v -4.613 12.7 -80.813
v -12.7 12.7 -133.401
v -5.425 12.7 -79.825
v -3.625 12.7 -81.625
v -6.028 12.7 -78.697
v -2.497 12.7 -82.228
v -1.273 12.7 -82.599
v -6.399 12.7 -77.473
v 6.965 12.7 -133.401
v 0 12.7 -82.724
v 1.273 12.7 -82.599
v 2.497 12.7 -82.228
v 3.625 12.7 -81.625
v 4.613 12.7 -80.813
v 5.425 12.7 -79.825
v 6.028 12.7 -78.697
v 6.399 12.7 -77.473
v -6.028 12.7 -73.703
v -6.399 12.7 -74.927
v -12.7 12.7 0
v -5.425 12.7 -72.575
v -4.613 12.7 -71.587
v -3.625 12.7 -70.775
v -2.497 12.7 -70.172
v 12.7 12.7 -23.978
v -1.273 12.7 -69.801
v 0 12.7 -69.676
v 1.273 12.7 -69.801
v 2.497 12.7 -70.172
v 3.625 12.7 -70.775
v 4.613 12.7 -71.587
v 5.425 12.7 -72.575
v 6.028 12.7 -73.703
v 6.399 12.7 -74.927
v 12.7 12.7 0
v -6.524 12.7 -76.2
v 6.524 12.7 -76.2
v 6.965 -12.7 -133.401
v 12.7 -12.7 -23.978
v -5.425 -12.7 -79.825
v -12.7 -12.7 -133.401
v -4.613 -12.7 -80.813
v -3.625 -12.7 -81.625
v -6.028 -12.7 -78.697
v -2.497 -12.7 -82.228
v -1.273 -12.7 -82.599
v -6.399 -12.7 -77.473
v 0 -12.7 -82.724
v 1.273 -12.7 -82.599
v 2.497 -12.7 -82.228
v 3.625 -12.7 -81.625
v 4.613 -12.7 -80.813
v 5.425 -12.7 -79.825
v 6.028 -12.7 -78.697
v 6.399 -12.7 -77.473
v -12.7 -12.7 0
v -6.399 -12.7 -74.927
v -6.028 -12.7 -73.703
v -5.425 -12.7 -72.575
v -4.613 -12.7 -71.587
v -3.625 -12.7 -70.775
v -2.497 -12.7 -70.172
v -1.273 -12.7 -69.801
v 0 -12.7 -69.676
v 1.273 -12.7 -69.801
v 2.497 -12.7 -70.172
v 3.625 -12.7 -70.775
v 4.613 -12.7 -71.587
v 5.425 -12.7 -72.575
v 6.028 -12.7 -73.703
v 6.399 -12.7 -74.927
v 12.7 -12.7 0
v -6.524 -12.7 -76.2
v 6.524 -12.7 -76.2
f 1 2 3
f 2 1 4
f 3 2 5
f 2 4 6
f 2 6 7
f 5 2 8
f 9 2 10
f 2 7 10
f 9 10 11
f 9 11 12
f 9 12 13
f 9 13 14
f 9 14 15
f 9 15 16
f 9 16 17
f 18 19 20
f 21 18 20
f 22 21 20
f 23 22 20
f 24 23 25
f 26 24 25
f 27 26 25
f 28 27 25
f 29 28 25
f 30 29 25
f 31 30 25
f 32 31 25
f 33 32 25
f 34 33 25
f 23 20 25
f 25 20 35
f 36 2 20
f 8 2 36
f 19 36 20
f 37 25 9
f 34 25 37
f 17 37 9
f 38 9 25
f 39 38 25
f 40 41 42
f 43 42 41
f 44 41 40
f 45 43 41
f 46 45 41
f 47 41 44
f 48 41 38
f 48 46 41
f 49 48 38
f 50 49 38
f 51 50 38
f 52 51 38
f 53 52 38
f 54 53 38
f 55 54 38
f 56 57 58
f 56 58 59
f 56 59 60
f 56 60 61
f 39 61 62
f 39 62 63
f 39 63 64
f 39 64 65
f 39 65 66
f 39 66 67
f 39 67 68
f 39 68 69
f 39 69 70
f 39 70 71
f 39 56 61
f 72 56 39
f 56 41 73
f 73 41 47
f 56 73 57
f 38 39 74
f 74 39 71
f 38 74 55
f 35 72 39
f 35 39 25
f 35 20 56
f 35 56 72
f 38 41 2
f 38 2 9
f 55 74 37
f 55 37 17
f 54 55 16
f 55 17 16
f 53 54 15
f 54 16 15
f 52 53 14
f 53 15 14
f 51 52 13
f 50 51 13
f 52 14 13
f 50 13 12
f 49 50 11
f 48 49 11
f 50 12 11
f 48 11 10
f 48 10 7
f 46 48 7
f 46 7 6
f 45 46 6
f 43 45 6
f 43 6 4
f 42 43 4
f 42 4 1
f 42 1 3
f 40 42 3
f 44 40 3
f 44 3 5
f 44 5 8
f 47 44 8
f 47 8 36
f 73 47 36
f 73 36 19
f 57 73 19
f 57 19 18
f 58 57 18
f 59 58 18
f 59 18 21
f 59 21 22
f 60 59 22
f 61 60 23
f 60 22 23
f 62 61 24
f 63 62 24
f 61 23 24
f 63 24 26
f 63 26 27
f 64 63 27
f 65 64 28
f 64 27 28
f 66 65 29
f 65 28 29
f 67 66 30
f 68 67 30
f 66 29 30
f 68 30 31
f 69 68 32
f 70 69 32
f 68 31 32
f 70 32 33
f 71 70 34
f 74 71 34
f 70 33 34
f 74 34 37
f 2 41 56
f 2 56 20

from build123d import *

# Parameters (mm, degrees)
SKETCH1_W           = 25.4
SKETCH1_H           = 25.4
BOSS_EXTRUDE1_DEPTH = 133.4008
SKETCH2_R           = 6.524301876
CUT_EXTRUDE2_DEPTH  = 26.4
CUT_EXTRUDE3_DEPTH  = 26.4


with BuildPart() as part:
    # Sketch1 → Boss-Extrude1 (new body)
    with BuildSketch(Plane.XY):
        Rectangle(SKETCH1_W, SKETCH1_H)
    extrude(amount=-BOSS_EXTRUDE1_DEPTH)

    # Sketch2 → Cut-Extrude2 (cut, through all)
    with BuildSketch(Plane(origin=(0, 12.7, 0), x_dir=(1, 0, 0), z_dir=(0, 1, 0))):
        with Locations((0, 76.2)):
            Circle(SKETCH2_R)
    extrude(amount=-CUT_EXTRUDE2_DEPTH, mode=Mode.SUBTRACT)

    # Sketch3 → Cut-Extrude3 (cut, through all)
    with BuildSketch(Plane(origin=(0, 12.7, 0), x_dir=(1, 0, 0), z_dir=(0, 1, 0))):
        Polygon((12.7, 133.4008), (6.96541308, 133.4008), (12.7, 23.978363128), align=None)
    extrude(amount=-CUT_EXTRUDE3_DEPTH, mode=Mode.SUBTRACT)


solid = part.part
